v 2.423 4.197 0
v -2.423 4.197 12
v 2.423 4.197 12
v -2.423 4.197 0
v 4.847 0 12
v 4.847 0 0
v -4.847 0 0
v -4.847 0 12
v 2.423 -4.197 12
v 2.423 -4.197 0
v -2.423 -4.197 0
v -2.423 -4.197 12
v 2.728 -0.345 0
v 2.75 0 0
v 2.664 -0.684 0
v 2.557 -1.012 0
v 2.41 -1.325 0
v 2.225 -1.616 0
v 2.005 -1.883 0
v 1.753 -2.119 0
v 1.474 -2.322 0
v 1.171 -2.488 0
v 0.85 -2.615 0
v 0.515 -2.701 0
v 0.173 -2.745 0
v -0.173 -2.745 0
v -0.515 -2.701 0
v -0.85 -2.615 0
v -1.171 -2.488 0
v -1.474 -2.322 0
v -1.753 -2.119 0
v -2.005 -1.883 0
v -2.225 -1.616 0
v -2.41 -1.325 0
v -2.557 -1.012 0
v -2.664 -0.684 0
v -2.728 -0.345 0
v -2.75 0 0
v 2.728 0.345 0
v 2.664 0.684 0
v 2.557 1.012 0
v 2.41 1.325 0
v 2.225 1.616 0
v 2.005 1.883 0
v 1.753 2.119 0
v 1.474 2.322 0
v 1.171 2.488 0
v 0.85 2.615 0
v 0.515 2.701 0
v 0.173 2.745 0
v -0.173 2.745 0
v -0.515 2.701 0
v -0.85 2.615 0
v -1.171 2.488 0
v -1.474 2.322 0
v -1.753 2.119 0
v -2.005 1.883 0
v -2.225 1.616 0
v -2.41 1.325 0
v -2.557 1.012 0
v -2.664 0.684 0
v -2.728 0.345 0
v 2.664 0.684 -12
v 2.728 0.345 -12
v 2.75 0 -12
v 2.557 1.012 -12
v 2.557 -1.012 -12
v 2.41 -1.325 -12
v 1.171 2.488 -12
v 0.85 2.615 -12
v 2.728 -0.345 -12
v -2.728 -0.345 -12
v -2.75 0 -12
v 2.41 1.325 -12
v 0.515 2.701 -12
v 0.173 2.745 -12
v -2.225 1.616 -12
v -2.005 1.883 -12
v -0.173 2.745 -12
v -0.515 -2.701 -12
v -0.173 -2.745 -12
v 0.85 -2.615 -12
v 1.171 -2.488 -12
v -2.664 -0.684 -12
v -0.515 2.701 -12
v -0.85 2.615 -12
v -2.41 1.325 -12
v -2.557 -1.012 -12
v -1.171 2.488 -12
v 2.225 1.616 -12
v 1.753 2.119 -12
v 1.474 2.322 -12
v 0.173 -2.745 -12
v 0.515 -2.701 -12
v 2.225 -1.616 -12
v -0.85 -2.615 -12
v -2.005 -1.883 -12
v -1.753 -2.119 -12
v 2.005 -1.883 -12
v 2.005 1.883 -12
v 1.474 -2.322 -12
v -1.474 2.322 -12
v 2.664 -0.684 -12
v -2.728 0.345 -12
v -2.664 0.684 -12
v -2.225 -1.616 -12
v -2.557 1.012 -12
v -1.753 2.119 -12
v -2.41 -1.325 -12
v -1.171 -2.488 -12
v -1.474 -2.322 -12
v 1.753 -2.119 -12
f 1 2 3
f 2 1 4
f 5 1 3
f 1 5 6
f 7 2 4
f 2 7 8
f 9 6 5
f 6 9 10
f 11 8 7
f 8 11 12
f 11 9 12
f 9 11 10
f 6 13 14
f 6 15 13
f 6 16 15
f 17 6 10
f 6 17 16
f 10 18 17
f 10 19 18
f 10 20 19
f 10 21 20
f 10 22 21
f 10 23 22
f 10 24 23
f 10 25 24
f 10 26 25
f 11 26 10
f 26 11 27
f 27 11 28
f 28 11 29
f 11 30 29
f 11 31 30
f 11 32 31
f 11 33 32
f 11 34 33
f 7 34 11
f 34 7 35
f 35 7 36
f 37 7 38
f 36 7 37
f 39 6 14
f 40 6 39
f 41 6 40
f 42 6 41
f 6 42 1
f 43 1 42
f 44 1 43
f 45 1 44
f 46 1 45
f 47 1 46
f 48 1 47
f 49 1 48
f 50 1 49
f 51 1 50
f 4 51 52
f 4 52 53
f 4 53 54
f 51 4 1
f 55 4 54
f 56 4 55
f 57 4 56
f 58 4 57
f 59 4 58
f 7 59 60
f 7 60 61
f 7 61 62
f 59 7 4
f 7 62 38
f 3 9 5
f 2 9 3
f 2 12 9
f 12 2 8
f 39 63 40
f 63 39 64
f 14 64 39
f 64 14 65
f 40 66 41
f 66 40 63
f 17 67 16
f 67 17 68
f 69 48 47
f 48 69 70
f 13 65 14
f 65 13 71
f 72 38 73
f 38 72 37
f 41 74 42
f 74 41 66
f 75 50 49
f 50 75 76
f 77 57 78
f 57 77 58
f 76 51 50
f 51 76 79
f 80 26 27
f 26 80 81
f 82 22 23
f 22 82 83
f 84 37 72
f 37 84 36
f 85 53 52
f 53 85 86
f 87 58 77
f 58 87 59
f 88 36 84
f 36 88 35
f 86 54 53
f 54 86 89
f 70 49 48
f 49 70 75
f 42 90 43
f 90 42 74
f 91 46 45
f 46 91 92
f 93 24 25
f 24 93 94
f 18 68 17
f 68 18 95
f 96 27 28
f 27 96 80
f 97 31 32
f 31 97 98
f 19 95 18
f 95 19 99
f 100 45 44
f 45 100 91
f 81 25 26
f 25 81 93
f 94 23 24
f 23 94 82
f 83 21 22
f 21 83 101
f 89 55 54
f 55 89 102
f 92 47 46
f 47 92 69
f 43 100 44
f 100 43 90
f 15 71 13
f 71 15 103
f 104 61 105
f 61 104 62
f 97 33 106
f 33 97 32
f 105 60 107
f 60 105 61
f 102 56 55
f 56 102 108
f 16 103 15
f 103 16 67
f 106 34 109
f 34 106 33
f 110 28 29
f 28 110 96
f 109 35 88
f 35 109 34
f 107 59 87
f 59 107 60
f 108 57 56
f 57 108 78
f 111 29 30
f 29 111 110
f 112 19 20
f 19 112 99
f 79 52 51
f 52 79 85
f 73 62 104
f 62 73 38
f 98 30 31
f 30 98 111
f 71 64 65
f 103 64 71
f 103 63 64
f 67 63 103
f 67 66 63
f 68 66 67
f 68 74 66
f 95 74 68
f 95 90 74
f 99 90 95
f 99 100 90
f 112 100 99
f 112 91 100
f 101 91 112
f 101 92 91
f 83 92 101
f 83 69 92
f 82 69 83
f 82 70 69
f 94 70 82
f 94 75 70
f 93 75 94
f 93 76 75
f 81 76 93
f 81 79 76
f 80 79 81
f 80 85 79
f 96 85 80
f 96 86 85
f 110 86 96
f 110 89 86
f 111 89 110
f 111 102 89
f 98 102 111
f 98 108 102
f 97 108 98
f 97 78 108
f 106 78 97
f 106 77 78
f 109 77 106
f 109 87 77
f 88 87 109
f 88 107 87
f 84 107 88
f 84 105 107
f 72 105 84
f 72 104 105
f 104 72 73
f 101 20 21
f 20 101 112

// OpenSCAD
$fn = 50;


difference() {
	union() {
		linear_extrude(height = 12) {
			polygon(points = [[4.8468000000, 0.0000000000], [2.4234000000, 4.1974519271], [-2.4234000000, 4.1974519271], [-4.8468000000, 0.0000000000], [-2.4234000000, -4.1974519271], [2.4234000000, -4.1974519271]]);
		}
		translate(v = [0, 0, -12]) {
			cylinder(h = 12, r = 2.7500000000);
		}
	}
	union();
}
